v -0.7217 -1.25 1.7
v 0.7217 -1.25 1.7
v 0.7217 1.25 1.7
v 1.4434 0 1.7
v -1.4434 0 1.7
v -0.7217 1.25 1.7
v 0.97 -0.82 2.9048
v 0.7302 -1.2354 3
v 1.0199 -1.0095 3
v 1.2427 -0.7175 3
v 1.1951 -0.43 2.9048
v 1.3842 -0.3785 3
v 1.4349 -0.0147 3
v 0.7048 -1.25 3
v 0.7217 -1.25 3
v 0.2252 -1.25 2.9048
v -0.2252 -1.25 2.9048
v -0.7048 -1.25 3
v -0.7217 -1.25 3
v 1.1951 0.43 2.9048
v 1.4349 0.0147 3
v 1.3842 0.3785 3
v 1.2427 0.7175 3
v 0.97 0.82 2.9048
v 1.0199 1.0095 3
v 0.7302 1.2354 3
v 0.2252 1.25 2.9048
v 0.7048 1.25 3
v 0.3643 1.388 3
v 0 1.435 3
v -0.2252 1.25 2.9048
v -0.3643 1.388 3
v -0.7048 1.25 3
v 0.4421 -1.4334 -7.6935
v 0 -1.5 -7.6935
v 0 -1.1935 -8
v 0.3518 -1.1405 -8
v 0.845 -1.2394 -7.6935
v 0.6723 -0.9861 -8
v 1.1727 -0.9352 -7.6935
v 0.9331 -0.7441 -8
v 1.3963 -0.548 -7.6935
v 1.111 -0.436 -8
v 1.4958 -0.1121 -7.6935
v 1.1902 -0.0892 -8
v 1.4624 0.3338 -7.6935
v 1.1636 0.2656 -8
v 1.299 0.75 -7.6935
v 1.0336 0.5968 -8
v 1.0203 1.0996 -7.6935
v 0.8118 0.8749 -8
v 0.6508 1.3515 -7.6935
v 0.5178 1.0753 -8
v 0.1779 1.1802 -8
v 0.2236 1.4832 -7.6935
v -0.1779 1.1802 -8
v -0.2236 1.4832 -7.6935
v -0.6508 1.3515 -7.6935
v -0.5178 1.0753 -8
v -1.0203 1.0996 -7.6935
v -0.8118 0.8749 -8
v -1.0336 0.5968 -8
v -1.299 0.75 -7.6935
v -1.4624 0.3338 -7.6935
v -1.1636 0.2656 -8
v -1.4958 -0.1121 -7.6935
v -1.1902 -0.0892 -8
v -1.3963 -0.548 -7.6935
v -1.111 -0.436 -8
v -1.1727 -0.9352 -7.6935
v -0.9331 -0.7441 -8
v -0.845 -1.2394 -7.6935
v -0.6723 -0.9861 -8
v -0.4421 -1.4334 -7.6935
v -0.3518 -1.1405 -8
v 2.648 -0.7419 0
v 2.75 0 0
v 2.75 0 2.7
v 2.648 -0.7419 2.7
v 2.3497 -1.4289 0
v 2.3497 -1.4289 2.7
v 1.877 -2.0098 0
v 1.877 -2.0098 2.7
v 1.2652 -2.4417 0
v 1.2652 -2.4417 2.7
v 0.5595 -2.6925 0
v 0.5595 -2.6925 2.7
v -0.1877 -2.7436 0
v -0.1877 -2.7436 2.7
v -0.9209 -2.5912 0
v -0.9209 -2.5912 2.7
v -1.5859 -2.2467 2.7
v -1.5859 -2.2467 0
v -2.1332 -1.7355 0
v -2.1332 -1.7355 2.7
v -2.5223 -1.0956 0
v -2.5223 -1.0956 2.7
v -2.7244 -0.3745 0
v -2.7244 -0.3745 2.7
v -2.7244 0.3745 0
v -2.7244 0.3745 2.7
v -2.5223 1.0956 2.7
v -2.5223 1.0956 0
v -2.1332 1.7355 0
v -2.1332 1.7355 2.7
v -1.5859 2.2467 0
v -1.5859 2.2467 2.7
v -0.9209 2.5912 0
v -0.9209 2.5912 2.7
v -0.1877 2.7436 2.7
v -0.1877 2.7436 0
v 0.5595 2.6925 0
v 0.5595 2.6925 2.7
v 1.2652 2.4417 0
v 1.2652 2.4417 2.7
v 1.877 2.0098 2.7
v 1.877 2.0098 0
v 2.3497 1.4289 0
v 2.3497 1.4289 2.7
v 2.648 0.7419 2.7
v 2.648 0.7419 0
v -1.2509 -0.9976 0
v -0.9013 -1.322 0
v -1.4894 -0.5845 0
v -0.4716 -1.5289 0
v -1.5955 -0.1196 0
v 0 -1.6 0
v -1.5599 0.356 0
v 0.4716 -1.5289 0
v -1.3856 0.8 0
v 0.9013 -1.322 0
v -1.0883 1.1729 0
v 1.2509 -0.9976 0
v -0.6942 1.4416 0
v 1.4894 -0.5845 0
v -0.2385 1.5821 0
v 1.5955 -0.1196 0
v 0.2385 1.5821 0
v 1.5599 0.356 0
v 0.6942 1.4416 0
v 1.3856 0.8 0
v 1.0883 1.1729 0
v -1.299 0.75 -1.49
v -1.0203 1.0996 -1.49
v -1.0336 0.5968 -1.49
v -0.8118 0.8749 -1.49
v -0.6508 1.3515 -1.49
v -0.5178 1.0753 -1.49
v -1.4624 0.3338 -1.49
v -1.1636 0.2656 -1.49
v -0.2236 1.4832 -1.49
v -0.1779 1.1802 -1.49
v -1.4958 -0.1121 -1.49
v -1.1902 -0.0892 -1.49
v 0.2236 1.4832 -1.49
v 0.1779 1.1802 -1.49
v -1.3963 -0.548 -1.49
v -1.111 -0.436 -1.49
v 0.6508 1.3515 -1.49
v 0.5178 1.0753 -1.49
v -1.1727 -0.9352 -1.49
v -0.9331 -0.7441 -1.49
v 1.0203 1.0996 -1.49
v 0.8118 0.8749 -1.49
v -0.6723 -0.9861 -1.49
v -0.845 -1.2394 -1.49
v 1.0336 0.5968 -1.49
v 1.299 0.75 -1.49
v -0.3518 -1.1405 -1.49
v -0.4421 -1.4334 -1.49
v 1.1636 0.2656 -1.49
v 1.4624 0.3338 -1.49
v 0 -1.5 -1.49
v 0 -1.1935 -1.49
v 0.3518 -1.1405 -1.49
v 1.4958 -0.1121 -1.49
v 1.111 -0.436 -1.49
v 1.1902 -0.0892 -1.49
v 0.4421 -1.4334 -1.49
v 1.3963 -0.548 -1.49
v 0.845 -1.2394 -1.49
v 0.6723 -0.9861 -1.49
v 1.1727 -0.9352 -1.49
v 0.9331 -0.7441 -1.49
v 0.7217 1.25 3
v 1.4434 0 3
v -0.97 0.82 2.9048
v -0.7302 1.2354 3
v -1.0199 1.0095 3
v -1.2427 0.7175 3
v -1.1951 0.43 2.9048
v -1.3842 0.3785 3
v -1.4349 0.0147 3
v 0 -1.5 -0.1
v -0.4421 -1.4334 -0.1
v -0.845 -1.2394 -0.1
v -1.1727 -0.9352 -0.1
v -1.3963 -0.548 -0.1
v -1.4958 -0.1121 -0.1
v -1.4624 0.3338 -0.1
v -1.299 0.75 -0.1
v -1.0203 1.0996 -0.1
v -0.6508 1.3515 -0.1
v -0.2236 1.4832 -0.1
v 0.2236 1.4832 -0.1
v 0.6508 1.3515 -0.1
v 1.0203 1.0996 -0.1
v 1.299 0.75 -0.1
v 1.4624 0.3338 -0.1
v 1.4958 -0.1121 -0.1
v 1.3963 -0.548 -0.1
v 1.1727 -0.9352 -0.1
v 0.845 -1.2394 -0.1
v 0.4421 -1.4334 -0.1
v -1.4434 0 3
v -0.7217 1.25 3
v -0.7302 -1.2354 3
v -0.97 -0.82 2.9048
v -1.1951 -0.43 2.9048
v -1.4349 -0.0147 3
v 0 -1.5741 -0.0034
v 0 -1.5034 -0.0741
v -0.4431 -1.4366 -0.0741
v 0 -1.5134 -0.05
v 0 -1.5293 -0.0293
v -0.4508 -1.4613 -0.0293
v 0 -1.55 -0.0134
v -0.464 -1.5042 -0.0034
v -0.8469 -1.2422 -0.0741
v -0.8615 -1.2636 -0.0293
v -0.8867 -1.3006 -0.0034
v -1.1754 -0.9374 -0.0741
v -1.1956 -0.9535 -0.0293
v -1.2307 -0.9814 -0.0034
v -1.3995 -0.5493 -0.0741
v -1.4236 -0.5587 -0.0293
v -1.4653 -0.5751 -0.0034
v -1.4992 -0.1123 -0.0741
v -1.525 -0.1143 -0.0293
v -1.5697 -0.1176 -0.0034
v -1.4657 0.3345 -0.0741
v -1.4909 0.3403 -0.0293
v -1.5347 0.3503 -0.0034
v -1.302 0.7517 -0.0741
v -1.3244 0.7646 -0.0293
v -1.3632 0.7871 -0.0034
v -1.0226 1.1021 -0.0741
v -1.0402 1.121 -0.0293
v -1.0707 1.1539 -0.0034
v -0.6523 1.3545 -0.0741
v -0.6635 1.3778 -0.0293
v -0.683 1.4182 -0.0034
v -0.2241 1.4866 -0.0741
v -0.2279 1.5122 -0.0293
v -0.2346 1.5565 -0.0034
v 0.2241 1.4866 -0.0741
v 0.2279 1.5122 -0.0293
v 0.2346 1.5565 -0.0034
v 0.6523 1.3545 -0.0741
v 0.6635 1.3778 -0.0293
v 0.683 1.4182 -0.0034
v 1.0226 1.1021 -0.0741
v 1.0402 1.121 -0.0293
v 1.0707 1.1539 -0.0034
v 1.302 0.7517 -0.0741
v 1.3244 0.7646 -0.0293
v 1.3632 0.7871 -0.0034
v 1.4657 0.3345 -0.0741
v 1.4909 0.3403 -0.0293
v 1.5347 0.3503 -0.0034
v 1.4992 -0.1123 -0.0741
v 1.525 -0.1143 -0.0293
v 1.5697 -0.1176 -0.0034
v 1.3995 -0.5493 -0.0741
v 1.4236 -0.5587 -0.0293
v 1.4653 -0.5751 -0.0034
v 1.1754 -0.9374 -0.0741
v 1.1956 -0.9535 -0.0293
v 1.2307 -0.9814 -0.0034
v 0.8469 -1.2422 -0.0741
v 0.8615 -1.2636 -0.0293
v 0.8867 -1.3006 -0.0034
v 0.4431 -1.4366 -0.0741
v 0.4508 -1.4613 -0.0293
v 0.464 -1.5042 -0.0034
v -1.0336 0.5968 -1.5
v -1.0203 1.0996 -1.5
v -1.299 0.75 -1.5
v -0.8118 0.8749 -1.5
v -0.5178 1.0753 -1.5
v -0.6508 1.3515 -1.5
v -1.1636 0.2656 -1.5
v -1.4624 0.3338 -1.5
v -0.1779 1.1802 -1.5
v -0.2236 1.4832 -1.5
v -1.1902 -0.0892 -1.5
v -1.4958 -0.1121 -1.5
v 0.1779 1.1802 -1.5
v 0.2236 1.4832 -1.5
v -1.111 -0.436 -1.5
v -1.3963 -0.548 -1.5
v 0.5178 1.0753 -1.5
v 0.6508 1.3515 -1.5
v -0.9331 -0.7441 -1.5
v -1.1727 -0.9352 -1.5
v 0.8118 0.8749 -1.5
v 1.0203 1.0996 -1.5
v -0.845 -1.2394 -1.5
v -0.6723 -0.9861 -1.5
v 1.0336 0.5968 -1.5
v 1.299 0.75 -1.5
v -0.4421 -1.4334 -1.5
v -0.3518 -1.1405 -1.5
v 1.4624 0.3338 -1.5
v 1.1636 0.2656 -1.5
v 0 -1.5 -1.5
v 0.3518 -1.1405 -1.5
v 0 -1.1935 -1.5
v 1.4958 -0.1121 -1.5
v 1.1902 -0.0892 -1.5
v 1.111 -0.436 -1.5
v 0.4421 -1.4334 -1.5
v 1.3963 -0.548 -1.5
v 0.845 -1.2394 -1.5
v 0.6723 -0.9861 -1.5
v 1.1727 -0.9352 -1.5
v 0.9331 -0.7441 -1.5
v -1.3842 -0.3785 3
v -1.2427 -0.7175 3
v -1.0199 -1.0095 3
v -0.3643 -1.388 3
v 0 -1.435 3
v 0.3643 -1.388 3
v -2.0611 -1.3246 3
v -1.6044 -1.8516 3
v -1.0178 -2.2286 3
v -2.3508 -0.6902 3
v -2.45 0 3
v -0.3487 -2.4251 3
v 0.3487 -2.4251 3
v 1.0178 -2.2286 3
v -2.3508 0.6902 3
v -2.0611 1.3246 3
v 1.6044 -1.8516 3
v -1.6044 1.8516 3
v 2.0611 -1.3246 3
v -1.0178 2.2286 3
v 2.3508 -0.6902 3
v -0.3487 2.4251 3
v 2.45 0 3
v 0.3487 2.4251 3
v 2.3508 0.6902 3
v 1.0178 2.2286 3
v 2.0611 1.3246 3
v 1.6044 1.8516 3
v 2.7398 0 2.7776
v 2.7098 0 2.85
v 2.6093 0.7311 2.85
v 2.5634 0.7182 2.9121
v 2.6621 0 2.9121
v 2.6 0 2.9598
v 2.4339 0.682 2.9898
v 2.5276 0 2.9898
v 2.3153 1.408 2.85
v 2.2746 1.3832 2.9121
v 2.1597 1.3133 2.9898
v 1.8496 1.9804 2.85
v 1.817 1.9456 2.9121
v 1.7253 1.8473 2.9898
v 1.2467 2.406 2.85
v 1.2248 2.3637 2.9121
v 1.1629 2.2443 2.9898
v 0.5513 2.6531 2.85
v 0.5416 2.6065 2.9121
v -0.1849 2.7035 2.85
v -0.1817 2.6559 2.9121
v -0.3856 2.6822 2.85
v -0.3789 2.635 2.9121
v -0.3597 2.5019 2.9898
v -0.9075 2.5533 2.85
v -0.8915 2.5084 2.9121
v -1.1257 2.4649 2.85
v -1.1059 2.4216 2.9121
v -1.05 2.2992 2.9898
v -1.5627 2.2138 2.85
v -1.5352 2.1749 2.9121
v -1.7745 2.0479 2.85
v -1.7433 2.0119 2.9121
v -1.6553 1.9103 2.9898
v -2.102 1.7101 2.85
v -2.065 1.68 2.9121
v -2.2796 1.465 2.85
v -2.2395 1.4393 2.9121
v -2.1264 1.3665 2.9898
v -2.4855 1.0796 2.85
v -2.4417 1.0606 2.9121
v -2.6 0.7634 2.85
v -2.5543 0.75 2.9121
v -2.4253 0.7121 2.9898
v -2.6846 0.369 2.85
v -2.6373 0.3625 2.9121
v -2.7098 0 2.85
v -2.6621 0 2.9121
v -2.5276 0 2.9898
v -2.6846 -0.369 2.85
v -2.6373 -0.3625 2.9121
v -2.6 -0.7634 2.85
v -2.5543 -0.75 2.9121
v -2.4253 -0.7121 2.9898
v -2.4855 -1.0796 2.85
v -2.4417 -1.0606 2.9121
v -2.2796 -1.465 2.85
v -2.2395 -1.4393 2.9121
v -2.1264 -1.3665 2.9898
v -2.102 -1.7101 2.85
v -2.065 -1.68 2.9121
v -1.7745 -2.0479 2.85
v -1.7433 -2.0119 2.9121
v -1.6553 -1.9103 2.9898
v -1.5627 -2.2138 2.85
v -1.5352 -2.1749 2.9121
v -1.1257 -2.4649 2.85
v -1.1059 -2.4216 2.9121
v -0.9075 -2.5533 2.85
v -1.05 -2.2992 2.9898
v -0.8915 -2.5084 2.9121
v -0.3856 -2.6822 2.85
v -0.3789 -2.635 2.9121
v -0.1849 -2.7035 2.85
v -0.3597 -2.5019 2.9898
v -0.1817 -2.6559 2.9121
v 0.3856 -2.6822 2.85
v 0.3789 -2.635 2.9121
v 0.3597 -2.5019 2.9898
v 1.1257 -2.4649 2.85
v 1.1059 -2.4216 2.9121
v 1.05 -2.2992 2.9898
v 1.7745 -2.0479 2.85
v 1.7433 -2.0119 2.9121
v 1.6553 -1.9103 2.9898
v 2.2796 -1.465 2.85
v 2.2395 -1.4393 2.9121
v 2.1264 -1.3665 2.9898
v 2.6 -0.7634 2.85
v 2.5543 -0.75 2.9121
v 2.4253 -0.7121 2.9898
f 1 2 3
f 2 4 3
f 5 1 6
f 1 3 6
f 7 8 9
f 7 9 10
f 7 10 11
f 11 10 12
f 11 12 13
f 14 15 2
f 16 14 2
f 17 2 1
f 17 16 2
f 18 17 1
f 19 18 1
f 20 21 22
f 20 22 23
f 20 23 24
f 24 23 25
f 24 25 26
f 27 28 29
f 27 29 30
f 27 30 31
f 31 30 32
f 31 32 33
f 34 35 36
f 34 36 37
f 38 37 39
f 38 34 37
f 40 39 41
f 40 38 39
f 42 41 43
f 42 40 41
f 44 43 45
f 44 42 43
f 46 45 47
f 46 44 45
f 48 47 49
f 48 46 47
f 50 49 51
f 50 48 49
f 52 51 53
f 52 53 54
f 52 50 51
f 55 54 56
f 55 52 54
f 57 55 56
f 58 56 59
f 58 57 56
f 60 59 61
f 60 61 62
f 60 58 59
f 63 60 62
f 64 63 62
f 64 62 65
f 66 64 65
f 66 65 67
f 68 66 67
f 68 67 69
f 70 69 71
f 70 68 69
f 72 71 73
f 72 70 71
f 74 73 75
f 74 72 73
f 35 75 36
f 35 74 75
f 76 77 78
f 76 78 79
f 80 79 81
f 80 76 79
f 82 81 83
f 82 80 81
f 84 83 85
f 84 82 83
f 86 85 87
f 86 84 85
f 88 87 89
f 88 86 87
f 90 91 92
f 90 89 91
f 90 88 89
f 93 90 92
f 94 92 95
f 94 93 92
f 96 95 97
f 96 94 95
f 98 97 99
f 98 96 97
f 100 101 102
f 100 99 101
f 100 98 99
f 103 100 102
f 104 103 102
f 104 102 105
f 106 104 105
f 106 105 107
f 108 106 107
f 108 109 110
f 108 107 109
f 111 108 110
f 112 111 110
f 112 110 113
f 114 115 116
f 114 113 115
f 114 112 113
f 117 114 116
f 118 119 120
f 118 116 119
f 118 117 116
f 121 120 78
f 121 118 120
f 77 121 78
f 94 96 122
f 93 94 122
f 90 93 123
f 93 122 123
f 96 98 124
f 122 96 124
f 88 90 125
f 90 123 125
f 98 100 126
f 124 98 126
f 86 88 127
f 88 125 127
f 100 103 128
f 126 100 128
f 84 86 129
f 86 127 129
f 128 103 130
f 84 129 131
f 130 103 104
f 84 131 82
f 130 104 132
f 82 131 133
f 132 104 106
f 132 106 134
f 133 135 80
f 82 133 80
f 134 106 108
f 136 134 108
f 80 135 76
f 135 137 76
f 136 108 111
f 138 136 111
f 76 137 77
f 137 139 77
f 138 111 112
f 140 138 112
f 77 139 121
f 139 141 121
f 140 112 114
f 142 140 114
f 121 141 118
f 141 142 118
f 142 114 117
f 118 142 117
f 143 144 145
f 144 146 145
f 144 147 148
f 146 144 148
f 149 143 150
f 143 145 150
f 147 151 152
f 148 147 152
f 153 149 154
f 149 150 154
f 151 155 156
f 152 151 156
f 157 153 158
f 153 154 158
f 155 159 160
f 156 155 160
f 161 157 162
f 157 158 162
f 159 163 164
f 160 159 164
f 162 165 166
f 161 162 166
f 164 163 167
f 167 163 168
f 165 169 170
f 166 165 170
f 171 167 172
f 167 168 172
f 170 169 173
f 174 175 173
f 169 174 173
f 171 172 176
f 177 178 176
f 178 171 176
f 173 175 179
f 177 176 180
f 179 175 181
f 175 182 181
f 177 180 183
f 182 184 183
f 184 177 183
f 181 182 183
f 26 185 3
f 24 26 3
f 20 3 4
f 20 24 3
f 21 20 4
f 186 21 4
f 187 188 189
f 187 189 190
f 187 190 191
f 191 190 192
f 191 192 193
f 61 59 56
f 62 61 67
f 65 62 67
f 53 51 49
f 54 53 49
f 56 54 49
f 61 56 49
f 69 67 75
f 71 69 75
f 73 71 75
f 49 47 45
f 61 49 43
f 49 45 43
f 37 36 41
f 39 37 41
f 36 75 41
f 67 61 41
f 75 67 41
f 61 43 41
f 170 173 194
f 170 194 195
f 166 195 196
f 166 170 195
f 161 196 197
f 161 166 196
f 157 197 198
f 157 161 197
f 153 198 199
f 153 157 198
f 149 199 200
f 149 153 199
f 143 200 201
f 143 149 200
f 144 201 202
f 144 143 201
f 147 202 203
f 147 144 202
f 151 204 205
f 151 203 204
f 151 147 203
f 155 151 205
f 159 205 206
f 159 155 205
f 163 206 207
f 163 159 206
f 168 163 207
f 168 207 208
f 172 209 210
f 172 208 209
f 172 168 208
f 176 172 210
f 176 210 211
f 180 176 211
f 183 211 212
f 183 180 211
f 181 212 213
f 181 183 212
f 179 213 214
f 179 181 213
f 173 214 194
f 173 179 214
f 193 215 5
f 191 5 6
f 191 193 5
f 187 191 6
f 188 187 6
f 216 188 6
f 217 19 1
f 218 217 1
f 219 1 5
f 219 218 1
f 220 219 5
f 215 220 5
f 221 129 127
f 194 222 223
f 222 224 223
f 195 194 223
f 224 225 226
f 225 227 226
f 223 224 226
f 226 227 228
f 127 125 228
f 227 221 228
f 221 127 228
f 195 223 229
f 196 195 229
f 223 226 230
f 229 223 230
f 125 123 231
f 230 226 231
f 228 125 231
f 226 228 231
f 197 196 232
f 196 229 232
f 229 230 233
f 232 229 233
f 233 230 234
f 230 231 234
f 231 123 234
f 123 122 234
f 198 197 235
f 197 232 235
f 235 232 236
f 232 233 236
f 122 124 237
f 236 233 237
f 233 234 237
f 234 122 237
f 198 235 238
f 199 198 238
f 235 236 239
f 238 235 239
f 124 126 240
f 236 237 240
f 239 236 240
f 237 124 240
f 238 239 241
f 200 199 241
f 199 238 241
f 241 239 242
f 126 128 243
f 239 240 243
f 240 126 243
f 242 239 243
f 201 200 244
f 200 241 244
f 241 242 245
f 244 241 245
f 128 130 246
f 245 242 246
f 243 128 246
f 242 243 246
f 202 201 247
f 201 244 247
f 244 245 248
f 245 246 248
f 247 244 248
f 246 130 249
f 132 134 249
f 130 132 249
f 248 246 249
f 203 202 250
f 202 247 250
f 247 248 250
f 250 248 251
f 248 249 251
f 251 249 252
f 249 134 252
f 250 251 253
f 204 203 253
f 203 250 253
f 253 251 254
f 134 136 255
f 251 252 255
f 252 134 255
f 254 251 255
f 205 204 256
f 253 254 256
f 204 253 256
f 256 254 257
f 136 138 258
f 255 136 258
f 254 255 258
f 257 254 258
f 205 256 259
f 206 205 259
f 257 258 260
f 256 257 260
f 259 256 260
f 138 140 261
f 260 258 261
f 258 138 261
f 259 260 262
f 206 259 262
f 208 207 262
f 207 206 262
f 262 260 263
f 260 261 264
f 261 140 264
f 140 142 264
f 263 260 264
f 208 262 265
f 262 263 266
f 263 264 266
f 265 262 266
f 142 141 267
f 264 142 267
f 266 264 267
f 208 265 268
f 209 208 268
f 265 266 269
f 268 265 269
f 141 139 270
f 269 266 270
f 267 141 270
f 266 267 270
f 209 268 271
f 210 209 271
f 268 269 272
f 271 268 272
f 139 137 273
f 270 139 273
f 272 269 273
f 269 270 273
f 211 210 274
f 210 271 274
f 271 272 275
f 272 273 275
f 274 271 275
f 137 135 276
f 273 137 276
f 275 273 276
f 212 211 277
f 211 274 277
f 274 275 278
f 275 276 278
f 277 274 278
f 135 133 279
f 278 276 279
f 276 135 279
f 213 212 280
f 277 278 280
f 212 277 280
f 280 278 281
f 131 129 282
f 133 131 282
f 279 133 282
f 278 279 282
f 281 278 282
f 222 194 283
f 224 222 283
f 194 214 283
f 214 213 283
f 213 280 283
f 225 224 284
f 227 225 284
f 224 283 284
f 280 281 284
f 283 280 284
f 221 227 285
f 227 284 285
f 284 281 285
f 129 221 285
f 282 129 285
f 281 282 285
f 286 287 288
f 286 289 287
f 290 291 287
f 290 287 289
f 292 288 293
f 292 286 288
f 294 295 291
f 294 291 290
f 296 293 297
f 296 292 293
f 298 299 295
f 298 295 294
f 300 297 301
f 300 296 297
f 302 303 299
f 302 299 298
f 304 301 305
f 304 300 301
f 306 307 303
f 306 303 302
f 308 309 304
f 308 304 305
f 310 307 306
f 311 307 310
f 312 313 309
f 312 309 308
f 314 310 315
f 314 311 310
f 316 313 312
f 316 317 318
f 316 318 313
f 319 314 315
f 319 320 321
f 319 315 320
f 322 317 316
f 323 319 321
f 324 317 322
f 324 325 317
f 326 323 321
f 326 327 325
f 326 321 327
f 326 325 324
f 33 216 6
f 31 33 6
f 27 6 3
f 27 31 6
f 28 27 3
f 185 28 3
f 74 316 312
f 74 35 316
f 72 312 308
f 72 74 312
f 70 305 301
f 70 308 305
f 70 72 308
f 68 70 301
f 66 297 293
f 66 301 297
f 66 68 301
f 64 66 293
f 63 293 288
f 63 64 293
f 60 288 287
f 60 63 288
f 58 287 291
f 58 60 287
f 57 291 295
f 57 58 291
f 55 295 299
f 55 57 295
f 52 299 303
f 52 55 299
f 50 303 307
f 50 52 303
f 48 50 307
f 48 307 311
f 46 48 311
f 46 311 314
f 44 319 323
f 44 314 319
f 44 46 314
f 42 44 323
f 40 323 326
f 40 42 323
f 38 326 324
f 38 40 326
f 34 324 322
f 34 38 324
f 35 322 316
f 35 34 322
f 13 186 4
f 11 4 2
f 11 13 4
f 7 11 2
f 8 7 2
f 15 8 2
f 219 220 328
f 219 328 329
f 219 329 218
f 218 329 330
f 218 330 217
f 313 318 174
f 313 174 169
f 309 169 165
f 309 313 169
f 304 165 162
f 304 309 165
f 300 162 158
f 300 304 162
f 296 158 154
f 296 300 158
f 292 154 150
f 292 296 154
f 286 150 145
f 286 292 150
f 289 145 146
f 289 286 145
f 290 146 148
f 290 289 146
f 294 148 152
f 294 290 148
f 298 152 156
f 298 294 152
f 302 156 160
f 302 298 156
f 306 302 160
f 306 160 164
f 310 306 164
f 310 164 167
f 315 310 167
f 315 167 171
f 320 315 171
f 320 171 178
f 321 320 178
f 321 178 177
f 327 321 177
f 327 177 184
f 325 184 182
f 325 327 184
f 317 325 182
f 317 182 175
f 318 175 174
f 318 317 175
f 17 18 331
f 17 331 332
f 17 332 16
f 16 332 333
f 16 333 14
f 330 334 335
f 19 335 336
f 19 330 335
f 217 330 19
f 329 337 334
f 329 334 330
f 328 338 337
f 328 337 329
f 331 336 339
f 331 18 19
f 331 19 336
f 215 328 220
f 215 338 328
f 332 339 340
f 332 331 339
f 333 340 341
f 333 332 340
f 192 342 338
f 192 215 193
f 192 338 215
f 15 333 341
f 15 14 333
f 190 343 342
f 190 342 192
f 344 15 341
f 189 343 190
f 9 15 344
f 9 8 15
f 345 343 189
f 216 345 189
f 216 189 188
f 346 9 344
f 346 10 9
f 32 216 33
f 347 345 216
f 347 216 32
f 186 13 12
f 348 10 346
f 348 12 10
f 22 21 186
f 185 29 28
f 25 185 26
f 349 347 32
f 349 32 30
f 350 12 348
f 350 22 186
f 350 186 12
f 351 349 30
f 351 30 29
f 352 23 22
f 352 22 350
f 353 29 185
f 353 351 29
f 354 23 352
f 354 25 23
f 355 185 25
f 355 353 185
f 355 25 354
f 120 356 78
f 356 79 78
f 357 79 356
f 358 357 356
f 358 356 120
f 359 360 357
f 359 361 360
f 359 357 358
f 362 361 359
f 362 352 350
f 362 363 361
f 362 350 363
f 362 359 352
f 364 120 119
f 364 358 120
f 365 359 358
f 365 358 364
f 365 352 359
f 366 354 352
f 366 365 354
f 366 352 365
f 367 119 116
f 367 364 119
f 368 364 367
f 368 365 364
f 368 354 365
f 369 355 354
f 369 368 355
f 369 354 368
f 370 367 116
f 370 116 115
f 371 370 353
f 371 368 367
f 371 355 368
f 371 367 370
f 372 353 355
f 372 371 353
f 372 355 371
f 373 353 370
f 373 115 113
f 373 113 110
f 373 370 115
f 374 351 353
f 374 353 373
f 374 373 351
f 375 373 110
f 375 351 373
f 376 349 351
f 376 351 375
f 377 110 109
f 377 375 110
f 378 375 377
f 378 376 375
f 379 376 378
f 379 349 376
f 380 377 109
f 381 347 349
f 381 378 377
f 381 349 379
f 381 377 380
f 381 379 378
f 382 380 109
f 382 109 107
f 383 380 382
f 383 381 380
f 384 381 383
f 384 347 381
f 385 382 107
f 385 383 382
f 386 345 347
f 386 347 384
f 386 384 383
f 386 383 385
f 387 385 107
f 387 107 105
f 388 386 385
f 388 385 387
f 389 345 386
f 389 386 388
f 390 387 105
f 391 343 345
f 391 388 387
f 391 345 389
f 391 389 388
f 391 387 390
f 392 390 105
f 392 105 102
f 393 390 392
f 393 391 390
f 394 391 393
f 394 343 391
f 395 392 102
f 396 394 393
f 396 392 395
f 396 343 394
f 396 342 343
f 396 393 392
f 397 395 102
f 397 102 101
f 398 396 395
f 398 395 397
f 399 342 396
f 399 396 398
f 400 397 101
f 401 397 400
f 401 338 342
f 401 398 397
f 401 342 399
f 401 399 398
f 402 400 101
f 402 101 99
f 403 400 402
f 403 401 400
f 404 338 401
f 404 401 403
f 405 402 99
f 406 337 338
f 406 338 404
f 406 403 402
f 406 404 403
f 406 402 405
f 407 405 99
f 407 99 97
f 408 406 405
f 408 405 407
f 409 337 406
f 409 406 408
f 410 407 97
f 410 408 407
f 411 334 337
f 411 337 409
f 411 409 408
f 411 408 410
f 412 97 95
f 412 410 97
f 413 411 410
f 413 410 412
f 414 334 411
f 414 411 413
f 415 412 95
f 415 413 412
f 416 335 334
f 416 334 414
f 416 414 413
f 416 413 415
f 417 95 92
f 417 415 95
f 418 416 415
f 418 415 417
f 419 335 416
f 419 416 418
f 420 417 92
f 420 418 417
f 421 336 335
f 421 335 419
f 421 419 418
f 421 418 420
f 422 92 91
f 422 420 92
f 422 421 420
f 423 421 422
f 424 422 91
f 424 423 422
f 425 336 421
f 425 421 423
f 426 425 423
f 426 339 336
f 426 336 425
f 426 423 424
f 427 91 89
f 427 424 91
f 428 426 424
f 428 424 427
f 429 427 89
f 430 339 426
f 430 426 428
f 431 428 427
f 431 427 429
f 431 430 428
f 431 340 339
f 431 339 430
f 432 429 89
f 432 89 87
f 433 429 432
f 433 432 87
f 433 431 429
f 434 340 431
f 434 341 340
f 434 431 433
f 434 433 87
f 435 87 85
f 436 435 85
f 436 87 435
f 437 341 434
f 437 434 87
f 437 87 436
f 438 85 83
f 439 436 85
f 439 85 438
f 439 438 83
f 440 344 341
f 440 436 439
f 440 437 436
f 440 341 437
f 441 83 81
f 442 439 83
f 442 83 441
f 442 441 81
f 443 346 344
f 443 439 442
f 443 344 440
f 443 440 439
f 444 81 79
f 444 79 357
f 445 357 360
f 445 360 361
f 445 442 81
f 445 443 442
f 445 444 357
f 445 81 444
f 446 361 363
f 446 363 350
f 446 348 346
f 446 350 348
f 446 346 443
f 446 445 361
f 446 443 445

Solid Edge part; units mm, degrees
sketch "Sketch1" plane through (0, 0, 0) normal (0, 0, 1) x (1, 0, 0)
  circle A0 centre (0, 0) radius 2.75
extrude "Protrusion1" add sketch "Sketch1" along normal blind 3
sketch "Sketch2" plane through (0, 0, 3) normal (0, 0, 1) x (0, 1, 0)
  line L0 (0, 1.4434) -> (1.25, 0.7217)
  line L1 (1.25, 0.7217) -> (1.25, -0.7217)
  line L2 (1.25, -0.7217) -> (0, -1.4434)
  line L3 (0, -1.4434) -> (-1.25, -0.7217)
  line L4 (-1.25, -0.7217) -> (-1.25, 0.7217)
  line L5 (-1.25, 0.7217) -> (0, 1.4434)
extrude "Cutout1" cut sketch "Sketch2" against normal blind 1.3
fillet "Round1" radius 0.3 1 edges at (-2.75, 0, 3)
sketch "Sketch3" plane through (0, 0, 0) normal (1, 0, 0) x (0, 1, 0)
  line L0 (-1.1935, -8) -> (0, -8)
  line L1 (-1.5, -7.6935) -> (-1.1935, -8)
  line L2 (-1.5, -1.5) -> (-1.5, -7.6935)
  line L3 (-1.1935, -1.5) -> (-1.5, -1.5)
  line L4 (-1.1935, -1.49) -> (-1.1935, -1.5)
  line L5 (-1.5, -1.49) -> (-1.1935, -1.49)
  line L6 (-1.5, -0.1) -> (-1.5, -1.49)
  arc A0 (-1.5, -0.1) -> (-1.6, 0) centre (-1.6, -0.1) ccw
  dimension "D1" = 1.5
  dimension "D2" = 0.01
  dimension "D3" = 0.1
  dimension "D4" = 8
revolve "RevolvedProtrusion1" add sketch "Sketch3" angle 360 about axis through (0, 0, -60.325) along (0, 0, 1) material side at (0, -0.5968, -7.95)
cosmetic_thread "Thread1" size "M3"
sketch "Sketch4" plane through (0, 0, 0) normal (0, -1, 0) x (1, 0, 0)
  line L0 (-1.435, 3) -> (0, 2.1715)
revolve "RevolvedCutout1" cut sketch "Sketch4" angle 360 about axis through (0, 0, 57.15) along (0, 0, -1) material side at (-0.6925, 0, 2.6291)
properties material "Stahl"
